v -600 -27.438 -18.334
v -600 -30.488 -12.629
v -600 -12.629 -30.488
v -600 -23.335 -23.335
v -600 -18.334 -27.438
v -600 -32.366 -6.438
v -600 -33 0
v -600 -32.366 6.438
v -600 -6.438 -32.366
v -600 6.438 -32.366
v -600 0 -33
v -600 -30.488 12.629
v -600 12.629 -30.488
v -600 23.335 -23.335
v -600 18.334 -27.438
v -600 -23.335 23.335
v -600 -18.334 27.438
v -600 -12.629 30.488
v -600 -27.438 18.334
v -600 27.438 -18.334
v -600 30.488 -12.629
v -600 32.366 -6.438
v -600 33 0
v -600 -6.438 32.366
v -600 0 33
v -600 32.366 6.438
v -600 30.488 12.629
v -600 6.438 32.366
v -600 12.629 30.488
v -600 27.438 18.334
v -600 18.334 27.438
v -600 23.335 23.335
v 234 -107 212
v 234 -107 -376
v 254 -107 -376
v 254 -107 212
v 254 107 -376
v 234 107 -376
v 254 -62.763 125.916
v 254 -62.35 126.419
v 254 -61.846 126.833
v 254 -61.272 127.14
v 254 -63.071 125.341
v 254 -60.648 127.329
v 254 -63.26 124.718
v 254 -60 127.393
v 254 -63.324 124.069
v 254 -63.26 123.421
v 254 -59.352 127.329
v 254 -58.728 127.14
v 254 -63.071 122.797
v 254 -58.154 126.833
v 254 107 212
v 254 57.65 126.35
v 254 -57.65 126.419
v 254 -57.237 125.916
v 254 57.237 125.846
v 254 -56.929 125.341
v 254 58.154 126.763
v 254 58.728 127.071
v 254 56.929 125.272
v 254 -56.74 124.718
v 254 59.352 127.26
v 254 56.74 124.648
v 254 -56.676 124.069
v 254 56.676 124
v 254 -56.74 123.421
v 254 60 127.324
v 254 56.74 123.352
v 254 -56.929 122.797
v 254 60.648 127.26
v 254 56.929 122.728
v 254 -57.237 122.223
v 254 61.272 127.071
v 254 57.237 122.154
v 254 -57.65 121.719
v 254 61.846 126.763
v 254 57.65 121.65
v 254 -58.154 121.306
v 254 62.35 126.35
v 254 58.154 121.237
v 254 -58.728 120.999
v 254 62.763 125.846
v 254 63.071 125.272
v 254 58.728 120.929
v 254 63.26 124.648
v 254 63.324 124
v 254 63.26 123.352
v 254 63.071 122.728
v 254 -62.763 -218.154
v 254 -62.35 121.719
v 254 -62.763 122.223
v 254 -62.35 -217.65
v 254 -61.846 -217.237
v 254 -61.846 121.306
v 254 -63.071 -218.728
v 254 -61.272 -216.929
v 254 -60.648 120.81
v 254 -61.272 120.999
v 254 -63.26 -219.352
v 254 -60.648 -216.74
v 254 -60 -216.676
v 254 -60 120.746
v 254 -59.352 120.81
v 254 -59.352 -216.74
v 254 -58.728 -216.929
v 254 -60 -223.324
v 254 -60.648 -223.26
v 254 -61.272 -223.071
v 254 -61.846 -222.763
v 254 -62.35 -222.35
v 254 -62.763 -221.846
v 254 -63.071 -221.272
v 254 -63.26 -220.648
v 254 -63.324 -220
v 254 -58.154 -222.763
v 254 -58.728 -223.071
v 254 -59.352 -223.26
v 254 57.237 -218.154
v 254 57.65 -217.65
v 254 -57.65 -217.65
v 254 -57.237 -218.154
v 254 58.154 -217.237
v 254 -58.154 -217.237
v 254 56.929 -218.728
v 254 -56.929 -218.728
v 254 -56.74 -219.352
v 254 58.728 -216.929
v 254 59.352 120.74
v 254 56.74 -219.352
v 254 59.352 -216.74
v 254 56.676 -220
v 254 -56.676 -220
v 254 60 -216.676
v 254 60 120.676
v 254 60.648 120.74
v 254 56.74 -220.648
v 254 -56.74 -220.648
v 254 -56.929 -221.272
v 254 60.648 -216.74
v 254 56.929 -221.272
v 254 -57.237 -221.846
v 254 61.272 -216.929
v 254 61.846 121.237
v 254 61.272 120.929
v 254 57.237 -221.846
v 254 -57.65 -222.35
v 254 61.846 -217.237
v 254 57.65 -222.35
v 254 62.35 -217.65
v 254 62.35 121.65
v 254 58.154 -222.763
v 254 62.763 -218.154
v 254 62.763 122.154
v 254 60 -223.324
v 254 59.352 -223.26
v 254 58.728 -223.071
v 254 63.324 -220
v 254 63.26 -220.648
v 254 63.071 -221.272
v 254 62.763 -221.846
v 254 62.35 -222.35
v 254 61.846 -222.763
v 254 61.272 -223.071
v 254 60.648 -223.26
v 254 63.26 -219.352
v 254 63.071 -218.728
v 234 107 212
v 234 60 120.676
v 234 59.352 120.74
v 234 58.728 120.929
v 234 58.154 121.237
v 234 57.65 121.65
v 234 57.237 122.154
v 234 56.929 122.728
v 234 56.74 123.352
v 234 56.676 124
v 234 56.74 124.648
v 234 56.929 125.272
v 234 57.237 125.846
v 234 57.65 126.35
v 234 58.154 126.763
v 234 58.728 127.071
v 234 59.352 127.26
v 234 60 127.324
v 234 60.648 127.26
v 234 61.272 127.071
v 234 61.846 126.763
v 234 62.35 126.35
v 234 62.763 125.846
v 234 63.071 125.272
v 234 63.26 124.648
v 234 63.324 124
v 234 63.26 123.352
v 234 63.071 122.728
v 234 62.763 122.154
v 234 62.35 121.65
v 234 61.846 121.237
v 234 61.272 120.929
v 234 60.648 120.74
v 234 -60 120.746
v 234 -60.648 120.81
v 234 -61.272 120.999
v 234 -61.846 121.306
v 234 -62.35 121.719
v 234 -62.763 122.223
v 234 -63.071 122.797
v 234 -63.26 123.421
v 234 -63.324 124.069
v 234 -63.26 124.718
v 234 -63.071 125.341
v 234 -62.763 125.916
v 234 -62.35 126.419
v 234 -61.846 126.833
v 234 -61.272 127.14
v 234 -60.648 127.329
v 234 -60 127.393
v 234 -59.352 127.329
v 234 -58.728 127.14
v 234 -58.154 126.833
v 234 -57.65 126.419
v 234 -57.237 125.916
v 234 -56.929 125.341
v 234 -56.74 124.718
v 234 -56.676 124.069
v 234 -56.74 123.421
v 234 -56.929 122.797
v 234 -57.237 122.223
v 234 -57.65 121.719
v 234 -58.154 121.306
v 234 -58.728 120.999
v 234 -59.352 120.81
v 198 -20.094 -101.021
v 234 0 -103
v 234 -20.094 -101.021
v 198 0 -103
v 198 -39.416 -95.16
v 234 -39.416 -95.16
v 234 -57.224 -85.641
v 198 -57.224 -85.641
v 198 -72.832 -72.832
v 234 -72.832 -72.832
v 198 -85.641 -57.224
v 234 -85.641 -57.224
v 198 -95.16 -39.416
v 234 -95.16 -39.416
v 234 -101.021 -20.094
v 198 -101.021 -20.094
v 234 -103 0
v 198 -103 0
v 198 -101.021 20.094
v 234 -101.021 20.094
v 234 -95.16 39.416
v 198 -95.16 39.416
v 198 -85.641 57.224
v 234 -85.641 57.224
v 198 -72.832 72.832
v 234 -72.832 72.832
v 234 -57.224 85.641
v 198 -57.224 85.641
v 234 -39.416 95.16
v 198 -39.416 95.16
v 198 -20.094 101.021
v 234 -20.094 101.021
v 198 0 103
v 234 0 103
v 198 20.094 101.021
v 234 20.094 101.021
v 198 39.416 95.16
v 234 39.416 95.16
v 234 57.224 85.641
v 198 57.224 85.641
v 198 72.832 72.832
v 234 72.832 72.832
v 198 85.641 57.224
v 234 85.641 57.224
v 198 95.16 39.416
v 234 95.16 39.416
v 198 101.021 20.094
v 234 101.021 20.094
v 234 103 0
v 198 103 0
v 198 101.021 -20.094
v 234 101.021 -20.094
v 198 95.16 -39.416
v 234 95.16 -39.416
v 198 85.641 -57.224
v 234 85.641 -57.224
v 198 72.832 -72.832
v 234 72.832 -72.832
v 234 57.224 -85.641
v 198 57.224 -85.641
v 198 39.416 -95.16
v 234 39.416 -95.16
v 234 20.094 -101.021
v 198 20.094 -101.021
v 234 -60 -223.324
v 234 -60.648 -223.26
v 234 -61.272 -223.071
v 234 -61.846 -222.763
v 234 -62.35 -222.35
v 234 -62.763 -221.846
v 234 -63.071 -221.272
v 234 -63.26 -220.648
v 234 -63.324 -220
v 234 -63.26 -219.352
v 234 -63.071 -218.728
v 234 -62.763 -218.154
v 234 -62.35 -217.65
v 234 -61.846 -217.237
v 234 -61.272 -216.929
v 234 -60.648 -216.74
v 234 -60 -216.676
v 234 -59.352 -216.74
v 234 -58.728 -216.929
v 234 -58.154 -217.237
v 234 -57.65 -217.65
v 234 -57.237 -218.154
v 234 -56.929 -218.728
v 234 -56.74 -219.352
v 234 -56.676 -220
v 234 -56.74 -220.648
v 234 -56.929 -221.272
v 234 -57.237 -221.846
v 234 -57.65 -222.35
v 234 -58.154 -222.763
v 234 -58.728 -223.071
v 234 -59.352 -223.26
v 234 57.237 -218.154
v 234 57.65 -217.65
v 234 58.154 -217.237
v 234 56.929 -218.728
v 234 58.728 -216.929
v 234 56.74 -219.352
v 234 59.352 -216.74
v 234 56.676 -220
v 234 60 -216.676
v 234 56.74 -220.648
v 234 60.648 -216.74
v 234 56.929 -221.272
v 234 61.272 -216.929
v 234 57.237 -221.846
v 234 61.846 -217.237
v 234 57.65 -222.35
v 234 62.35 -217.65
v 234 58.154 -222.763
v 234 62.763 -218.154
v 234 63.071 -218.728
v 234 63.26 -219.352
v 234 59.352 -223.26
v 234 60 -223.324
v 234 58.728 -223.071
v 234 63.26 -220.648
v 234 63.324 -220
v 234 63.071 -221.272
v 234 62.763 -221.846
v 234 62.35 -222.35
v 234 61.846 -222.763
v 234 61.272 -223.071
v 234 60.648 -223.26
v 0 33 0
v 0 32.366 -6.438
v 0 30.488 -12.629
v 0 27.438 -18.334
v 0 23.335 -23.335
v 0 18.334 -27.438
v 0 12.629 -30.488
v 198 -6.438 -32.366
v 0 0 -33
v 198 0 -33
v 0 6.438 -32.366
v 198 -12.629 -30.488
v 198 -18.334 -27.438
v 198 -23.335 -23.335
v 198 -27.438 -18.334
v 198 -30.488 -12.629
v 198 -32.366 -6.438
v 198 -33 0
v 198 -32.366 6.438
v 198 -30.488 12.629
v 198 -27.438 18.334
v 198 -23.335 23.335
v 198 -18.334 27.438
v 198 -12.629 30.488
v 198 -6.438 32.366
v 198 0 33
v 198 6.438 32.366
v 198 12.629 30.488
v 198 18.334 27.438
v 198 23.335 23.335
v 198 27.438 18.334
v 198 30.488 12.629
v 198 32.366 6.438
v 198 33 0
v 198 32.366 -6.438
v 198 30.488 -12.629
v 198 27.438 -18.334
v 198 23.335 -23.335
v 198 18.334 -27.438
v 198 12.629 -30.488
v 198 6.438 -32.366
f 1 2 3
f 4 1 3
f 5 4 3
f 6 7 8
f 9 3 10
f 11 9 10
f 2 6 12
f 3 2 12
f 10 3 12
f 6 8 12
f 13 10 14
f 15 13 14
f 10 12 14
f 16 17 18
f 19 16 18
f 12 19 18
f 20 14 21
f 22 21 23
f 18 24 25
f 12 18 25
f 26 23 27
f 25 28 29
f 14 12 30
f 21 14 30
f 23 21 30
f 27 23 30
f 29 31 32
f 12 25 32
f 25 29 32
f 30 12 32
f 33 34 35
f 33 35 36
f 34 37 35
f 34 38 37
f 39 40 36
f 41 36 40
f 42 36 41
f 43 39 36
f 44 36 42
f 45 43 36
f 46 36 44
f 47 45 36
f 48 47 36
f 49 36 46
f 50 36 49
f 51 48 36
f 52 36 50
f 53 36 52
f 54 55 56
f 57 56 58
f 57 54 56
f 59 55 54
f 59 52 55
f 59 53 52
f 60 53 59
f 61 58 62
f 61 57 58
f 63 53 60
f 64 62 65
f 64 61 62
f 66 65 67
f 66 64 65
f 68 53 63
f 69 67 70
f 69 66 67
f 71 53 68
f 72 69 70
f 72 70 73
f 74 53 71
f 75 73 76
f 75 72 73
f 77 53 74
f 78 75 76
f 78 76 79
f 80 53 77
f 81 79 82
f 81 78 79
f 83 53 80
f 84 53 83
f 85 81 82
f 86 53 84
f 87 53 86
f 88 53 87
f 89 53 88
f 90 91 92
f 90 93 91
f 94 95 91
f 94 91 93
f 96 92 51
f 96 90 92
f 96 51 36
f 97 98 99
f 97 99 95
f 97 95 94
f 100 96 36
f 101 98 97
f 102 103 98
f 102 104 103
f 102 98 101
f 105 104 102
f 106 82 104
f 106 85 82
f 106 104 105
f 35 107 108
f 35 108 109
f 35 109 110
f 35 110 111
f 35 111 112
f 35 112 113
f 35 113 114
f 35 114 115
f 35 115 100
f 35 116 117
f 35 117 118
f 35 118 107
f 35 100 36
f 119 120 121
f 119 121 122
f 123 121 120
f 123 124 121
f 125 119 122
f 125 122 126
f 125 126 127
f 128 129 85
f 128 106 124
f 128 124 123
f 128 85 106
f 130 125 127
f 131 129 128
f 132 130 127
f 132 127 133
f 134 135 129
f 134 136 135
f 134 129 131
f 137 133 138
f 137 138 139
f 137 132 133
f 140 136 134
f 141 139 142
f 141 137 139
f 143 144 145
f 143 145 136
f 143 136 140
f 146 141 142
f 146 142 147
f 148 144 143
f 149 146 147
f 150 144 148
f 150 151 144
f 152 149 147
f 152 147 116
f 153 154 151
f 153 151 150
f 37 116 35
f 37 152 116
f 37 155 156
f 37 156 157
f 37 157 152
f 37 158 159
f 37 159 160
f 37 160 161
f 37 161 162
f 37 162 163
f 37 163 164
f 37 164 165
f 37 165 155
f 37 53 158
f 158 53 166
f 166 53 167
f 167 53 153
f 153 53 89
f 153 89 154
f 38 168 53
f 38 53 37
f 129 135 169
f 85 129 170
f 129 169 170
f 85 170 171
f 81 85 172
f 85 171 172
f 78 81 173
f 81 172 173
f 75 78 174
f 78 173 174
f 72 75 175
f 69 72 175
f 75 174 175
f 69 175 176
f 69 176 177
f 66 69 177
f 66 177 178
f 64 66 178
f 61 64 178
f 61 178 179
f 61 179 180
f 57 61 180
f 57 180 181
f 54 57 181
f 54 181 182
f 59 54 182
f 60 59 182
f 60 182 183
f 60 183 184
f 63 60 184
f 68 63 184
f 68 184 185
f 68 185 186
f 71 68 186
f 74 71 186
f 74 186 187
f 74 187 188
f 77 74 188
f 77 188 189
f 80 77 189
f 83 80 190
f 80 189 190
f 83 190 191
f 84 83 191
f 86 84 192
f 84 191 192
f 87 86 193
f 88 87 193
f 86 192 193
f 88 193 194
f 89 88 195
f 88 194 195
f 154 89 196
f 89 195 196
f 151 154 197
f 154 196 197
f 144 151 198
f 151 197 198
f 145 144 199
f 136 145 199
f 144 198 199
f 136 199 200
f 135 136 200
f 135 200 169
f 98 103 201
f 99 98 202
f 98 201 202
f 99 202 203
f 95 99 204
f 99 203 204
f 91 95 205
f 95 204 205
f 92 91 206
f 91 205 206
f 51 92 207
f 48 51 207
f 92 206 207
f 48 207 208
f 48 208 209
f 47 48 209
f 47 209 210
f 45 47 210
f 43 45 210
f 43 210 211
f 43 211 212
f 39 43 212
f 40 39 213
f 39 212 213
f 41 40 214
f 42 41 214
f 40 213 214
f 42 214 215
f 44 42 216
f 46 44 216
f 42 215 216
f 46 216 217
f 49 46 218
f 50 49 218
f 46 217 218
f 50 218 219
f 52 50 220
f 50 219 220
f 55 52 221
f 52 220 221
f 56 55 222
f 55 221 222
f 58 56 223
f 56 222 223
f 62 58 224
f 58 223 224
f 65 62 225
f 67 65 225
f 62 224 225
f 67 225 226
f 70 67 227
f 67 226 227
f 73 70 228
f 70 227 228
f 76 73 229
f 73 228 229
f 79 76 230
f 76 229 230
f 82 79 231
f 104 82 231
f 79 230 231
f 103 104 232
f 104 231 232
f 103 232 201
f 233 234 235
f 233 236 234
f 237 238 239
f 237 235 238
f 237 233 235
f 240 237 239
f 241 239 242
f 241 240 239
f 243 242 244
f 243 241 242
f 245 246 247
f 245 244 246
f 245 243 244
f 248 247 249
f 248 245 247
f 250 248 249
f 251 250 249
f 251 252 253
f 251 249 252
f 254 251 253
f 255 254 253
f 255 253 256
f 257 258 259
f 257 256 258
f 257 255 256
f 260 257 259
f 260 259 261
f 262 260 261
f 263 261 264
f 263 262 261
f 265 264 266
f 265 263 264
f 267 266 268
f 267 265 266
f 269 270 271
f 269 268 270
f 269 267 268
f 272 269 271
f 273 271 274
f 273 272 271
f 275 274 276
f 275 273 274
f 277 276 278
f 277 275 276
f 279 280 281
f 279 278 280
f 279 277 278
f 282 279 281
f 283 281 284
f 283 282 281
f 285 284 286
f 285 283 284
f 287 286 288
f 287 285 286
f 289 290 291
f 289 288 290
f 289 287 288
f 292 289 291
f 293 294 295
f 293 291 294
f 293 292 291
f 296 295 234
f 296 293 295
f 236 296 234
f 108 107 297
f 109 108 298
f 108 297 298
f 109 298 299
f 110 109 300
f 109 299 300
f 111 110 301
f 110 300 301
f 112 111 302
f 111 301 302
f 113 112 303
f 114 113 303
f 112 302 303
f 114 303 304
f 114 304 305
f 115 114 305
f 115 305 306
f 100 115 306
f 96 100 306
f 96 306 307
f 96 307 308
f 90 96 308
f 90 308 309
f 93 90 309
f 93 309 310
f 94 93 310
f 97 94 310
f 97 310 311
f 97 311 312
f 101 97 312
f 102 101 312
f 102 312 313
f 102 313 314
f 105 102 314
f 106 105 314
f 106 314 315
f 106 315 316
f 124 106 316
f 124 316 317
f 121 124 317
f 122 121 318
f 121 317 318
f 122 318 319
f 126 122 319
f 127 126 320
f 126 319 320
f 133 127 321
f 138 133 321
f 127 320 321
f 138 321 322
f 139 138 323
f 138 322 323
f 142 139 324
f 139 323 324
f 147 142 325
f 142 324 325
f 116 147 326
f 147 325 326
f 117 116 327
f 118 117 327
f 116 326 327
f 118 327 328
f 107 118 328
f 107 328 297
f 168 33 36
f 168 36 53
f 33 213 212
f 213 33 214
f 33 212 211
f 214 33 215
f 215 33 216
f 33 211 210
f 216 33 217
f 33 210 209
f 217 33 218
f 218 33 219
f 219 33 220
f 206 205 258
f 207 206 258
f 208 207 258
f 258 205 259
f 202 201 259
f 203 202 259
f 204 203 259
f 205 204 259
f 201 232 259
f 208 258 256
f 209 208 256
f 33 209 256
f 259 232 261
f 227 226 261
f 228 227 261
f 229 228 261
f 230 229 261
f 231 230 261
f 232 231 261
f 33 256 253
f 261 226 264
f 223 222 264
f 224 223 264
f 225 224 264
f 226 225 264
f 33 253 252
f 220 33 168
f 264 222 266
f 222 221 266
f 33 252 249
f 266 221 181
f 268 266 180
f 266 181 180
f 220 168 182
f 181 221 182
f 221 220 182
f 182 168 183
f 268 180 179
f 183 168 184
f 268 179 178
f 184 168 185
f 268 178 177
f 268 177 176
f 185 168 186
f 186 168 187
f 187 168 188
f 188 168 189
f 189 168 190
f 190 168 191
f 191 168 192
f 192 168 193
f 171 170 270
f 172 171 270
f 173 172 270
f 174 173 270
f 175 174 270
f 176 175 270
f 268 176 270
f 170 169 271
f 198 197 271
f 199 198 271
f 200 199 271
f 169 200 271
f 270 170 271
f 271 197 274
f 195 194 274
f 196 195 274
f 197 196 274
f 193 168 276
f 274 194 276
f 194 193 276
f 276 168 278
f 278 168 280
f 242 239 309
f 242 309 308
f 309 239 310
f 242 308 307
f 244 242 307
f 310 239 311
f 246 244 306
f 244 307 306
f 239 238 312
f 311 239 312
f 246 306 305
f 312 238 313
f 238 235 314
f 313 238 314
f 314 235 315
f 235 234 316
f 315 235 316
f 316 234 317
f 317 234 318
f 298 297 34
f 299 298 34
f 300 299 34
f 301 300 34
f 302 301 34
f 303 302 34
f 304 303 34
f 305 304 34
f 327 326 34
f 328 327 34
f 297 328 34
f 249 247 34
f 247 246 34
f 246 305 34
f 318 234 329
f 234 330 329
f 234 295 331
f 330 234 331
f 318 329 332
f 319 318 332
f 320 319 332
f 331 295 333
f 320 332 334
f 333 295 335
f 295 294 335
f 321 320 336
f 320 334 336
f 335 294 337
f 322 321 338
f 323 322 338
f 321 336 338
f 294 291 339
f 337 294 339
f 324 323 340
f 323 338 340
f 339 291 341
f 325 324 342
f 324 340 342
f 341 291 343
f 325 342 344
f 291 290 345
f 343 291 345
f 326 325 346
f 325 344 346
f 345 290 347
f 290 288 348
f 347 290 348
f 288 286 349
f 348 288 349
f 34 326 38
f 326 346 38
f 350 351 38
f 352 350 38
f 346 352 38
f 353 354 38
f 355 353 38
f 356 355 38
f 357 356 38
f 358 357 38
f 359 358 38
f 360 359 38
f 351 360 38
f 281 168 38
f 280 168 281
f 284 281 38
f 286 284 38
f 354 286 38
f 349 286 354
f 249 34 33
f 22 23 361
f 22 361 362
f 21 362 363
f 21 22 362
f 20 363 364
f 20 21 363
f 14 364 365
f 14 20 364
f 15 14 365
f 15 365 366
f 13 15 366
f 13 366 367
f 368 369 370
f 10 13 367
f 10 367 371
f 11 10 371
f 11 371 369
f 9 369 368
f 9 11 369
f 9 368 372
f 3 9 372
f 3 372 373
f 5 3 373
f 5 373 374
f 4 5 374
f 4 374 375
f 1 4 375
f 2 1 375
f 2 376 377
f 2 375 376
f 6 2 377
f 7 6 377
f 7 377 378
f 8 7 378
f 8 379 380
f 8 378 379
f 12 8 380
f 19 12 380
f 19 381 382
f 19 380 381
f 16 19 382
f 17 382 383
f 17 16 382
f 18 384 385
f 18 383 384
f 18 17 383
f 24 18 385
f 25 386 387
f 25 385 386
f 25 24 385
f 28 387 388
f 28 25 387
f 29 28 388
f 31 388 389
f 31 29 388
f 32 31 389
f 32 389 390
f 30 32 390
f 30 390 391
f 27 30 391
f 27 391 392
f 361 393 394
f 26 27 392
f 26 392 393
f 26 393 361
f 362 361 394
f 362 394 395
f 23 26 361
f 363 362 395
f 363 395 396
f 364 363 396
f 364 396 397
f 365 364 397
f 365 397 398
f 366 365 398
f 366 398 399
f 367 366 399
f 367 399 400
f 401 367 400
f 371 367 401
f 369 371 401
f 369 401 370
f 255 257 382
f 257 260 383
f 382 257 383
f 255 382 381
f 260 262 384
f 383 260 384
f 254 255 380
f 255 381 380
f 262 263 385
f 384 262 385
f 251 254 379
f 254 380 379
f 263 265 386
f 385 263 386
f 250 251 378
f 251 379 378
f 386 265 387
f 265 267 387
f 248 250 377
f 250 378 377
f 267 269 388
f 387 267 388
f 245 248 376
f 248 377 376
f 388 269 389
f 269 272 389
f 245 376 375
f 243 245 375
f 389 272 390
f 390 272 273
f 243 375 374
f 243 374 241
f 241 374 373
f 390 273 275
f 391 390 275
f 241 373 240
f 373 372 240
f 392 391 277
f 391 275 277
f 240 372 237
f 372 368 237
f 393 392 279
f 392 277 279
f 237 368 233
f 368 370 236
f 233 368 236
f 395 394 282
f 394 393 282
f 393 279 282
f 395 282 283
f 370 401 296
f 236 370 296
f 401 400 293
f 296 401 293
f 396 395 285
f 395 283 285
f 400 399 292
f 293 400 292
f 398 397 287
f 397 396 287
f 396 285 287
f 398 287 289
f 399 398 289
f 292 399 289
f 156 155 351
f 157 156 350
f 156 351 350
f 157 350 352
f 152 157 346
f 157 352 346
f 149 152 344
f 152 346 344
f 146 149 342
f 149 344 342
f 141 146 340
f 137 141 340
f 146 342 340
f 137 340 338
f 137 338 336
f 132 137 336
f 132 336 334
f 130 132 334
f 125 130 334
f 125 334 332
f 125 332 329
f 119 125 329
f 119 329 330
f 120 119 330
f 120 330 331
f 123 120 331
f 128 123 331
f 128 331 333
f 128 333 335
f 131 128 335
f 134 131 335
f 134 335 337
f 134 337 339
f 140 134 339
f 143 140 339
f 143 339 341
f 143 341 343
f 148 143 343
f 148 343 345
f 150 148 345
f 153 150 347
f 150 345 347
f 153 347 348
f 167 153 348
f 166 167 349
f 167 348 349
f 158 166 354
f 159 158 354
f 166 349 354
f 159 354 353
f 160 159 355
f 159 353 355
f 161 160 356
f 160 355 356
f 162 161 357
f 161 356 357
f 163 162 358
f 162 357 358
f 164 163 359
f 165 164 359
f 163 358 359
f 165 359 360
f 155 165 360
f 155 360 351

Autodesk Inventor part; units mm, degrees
ref_plane "YZ Plane" through (0, 0, 0) normal (1, 0, 0) x (0, 1, 0)
ref_plane "XZ Plane" through (0, 0, 0) normal (0, 1, 0) x (-1, 0, 0)
ref_plane "XY Plane" through (0, 0, 0) normal (0, 0, 1) x (1, 0, 0)
sketch "Sketch1" plane through (0, 0, 0) normal (1, 0, 0) x (0, 1, 0)
  circle A0 centre (0, 0) radius 33
extrude "Extrusion1" add sketch "Sketch1" against normal blind 600
sketch "Sketch2" plane through (0, 0, 0) normal (1, 0, 0) x (0, 0, -1)
  circle A0 centre (0, 0) radius 33
extrude "Extrusion2" add sketch "Sketch2" along normal blind 198
sketch "Sketch3" plane through (198, 0, 0) normal (1, 0, 0) x (0, 0, -1)
  circle A0 centre (0, 0) radius 103
extrude "Extrusion3" add sketch "Sketch3" along normal blind 36
sketch "Sketch4" plane through (234, 0, 0) normal (1, 0, 0) x (0, 0, -1)
  line L0 (-212, 107) -> (212, 107)
  line L1 (212, -107) -> (-212, -107)
  line L2 (-212, -107) -> (-212, 107)
  line L3 (-212, 107) -> (212, -107) construction
  line L4 (212, 107) -> (-212, -107) construction
  line L5 (212, 107) -> (376, 107)
  line L6 (376, 107) -> (376, -107)
  line L7 (376, -107) -> (212, -107)
  point P0 (0, 0)
  point P1 (0, 0)
extrude "Extrusion4" add sketch "Sketch4" along normal blind 20
sketch "Sketch5" plane through (254, 0, 0) normal (1, 0, 0) x (0, 0, -1)
  point P0 (0, 0)
  point P1 (-124.0692, -60)
  point P2 (-124, 60)
  point P3 (220, 60)
  point P4 (220, -60)
hole "Hole1" at (254, -60, 124.0692) at (254, 60, 124) at (254, 60, -220) at (254, -60, -220) direction (-1, 0, 0) diameter 6.647 depth 20 thread size "M8x1.25" class "6H" standard "ISO Metric profile"
properties part number "DecAxis"
